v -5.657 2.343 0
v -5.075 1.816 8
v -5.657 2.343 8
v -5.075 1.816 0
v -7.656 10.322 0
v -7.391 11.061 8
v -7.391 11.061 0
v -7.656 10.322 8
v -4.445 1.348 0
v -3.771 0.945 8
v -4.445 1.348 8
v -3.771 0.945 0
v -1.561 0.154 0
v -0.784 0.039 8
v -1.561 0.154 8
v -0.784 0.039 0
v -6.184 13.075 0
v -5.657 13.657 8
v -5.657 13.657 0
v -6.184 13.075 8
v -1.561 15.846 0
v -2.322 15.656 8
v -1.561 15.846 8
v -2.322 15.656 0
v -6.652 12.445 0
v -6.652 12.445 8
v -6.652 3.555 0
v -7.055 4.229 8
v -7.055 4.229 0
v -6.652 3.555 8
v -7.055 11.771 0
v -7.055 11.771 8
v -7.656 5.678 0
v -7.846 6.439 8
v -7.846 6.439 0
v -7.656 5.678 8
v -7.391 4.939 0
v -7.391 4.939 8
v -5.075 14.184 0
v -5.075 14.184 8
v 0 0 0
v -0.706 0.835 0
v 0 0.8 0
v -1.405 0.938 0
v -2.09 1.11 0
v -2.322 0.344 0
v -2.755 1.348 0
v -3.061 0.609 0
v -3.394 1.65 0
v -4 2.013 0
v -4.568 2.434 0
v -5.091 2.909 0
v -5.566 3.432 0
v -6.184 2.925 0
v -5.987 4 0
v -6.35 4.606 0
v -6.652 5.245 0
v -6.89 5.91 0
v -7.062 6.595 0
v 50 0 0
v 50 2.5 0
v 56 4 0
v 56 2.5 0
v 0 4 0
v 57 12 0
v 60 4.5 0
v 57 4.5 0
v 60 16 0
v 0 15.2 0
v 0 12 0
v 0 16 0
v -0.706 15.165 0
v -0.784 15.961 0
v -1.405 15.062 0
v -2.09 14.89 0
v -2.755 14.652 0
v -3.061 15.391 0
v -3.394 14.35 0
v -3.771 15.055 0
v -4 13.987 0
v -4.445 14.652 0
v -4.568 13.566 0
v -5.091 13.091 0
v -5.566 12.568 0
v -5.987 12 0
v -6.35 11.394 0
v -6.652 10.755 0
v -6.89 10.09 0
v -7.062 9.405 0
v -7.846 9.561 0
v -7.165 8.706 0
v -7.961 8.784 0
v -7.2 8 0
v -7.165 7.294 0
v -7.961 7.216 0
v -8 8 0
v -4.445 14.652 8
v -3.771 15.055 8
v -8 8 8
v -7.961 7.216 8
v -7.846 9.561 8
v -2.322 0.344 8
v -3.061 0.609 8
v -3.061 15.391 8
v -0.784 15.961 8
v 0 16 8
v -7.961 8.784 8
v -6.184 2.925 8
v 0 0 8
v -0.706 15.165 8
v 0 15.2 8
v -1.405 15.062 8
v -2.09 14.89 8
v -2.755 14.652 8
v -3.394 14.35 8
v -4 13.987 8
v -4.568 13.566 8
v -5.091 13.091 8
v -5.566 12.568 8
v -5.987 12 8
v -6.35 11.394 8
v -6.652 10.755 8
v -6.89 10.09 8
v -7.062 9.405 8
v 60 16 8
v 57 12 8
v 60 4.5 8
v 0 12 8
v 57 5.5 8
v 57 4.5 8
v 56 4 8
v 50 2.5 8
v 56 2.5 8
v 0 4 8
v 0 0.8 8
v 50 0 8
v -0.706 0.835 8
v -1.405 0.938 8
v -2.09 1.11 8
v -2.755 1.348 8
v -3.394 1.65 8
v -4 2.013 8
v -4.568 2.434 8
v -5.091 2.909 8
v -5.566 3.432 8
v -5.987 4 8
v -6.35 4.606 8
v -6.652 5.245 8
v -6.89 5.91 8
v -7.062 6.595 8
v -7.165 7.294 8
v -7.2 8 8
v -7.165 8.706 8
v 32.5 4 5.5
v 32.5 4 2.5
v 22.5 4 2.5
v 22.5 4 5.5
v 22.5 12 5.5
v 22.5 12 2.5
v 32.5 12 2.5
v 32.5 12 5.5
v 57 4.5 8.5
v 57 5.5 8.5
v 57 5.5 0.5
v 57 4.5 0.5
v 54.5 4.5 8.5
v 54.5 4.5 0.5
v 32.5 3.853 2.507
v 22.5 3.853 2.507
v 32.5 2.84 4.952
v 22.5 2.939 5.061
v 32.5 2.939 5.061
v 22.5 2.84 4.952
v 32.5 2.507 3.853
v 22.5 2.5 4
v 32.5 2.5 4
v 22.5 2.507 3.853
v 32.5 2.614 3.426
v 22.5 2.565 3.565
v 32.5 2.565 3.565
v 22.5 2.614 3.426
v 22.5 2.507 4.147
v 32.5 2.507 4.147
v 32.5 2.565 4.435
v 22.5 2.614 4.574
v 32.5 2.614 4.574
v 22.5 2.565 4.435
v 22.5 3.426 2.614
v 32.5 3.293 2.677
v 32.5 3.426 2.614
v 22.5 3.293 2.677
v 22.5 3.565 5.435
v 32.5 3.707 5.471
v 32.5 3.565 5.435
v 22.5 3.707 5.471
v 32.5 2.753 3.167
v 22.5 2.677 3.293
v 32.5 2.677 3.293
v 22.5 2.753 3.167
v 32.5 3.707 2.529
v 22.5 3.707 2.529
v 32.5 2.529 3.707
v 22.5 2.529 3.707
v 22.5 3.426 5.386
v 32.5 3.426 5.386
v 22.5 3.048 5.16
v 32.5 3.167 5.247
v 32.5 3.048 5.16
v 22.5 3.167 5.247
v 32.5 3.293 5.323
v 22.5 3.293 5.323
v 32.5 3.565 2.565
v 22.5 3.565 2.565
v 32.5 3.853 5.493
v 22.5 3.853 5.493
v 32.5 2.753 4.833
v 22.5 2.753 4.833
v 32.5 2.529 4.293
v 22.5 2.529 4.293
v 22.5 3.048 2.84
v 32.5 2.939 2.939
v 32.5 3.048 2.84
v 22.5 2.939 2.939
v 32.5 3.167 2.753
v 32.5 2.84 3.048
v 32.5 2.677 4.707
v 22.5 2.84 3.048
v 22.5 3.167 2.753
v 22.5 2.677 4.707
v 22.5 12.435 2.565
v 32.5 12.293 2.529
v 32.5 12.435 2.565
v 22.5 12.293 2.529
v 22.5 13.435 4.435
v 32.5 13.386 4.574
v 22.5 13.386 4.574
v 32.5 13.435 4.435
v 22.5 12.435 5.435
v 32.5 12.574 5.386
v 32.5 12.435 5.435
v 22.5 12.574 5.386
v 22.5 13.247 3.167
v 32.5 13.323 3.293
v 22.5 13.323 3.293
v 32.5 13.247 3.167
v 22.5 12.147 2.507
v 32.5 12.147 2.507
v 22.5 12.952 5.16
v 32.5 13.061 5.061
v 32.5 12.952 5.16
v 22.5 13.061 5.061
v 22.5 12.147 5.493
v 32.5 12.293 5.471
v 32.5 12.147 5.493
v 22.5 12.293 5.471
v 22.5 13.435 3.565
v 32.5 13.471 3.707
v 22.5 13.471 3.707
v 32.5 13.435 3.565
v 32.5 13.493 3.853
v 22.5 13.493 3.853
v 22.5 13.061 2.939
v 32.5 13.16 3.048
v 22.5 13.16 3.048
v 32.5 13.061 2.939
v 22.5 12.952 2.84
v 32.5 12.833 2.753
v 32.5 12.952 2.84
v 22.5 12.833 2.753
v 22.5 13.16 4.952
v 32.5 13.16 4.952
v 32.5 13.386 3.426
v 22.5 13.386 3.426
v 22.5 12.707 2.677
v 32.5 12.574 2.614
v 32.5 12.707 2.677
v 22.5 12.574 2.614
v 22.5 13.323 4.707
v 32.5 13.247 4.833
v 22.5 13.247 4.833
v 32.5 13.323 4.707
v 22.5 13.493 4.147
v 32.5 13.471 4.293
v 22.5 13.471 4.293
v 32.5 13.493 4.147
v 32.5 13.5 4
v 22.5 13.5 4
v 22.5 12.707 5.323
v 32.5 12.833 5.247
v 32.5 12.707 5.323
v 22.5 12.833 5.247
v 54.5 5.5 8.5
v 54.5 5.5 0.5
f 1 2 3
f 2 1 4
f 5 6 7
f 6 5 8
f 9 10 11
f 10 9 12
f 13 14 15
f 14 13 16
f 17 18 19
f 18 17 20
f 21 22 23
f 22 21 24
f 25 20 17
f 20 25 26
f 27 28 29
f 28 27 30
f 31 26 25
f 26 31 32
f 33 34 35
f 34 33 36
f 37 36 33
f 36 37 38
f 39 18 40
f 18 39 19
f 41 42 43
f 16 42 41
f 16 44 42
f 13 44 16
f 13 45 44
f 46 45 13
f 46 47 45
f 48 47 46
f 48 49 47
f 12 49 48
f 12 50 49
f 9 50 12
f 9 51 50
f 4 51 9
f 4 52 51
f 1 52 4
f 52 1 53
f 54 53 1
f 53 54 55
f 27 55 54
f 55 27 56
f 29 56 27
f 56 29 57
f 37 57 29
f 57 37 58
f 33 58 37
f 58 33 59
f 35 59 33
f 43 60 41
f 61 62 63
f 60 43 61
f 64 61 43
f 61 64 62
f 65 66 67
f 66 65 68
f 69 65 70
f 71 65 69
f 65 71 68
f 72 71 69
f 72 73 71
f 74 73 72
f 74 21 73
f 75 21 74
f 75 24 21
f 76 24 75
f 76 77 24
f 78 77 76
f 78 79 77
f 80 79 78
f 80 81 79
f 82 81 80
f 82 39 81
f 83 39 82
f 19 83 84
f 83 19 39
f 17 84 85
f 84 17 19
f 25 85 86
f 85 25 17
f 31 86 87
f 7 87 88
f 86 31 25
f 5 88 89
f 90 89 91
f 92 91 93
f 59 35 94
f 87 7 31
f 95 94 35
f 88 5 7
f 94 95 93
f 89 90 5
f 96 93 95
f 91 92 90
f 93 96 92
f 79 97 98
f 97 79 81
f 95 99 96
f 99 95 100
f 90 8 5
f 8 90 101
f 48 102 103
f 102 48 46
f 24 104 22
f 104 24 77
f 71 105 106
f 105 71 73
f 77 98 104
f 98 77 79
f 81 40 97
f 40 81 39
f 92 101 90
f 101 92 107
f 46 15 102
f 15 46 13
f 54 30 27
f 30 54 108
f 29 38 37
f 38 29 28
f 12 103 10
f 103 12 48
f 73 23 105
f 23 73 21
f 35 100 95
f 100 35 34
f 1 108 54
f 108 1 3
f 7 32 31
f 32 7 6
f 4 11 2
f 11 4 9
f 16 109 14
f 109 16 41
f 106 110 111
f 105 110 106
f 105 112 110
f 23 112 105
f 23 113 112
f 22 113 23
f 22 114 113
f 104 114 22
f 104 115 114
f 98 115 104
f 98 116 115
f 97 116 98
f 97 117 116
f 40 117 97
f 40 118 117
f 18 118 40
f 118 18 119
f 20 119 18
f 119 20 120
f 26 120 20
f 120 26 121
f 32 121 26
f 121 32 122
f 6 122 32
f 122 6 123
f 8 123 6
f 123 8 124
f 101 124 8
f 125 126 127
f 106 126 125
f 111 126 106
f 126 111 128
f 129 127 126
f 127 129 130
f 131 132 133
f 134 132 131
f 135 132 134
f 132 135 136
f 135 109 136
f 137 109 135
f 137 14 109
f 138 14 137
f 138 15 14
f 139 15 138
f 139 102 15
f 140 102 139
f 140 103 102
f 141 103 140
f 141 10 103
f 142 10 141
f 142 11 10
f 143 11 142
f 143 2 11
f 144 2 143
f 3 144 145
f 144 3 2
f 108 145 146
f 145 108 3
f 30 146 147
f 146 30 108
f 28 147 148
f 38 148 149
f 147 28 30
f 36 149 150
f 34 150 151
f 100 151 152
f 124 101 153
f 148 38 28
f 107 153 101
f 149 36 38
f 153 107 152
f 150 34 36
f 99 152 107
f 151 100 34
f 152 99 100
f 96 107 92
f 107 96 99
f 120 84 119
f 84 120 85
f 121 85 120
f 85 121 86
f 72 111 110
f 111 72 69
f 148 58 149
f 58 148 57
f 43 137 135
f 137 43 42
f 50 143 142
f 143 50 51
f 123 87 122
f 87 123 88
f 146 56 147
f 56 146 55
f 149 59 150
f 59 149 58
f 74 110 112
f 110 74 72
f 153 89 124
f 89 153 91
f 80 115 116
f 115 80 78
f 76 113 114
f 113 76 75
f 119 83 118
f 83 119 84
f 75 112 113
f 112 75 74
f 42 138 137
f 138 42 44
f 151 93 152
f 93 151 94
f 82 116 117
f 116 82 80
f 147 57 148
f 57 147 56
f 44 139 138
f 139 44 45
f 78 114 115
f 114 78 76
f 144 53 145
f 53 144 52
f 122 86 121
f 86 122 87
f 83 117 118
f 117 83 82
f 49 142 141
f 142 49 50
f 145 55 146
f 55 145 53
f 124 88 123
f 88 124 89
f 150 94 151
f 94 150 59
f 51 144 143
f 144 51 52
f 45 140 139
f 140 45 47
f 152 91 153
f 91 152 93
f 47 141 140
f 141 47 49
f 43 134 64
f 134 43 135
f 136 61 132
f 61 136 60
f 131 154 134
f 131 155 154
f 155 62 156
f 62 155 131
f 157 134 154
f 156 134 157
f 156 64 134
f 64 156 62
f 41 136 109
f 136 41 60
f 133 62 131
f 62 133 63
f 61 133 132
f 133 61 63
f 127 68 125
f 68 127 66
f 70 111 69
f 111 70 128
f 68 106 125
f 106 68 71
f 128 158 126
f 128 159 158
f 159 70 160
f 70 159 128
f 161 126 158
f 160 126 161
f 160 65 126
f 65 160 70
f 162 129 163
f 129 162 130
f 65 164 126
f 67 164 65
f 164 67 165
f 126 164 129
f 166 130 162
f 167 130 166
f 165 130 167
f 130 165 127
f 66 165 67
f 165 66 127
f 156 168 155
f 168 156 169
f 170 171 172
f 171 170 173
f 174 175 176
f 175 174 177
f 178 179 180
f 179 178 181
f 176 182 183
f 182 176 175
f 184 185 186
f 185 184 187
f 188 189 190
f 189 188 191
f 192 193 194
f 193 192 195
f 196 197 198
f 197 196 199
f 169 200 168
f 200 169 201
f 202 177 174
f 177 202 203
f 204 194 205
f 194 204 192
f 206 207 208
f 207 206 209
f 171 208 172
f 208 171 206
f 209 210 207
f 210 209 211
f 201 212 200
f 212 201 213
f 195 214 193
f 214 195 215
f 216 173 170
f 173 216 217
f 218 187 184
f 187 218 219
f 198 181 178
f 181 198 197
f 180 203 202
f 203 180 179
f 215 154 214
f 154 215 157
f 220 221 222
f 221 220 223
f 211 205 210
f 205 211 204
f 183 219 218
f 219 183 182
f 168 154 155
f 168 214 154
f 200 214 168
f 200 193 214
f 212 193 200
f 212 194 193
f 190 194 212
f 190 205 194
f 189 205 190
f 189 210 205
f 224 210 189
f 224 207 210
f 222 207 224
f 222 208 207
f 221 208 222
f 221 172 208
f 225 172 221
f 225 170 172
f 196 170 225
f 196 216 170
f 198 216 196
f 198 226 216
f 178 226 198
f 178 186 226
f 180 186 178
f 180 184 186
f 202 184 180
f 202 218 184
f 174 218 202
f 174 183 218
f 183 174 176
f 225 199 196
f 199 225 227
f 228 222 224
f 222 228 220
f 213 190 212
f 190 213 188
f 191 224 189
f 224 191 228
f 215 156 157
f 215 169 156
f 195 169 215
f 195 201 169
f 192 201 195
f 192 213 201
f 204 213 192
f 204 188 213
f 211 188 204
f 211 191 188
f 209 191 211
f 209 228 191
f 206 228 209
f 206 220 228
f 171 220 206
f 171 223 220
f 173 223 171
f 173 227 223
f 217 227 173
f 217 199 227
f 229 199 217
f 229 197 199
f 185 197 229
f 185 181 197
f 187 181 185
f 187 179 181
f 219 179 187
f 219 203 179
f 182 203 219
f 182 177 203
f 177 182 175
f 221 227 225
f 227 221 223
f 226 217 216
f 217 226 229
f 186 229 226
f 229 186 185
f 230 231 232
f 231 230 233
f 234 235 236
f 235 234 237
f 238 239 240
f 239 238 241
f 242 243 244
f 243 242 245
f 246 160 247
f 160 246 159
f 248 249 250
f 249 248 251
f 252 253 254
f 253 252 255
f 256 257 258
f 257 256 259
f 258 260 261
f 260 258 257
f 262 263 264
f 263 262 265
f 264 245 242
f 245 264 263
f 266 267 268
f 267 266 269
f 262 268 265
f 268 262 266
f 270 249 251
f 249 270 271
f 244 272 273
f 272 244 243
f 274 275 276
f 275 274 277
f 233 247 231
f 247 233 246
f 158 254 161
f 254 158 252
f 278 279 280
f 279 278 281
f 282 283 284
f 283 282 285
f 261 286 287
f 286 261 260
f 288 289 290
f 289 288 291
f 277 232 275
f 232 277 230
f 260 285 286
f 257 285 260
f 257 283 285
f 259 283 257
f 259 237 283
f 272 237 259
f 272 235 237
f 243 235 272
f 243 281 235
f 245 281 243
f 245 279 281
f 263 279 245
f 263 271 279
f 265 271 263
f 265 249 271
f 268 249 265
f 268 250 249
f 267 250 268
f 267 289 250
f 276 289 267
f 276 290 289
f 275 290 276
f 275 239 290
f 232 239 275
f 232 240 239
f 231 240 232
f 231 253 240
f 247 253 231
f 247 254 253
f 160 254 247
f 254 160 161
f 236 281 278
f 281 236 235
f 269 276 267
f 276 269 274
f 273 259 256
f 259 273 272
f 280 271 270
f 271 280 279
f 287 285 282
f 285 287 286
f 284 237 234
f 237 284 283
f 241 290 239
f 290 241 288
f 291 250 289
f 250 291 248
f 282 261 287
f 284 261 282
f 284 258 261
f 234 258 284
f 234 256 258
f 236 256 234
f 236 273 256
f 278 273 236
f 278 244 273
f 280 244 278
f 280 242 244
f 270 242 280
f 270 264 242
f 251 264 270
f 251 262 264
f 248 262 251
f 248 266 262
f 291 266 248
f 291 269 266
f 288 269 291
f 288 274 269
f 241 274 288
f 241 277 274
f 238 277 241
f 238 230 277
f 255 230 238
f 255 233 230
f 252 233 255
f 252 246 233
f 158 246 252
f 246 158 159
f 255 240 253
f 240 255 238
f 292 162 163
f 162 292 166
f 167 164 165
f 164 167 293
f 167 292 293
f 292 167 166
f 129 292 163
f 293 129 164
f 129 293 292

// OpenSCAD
// --- Parameters ---
// Dimensions in mm
thickness = 8;               // Extrusion depth along Z
lower_bar_len = 50;          // Length of lower bar
lower_bar_width = 4;         // Width of lower bar
lower_tongue_len = 6;         // Length of lower tongue (50 to 56)
lower_tongue_width = 1.5;    // Width of lower tongue (4 - 2.5 = 1.5)
lower_tongue_start_y = 2.5; // Y-offset for tongue

upper_bar_len = 60;          // Length of upper bar
upper_bar_width = 4;         // Width of upper bar
upper_bar_y_start = 12;      // Y-position of upper bar start
upper_bar_y_end = 16;        // Y-position of upper bar end

hinge_radius_inner = 7.2;    // Inner radius of hinge
hinge_radius_outer = 8.0;    // Outer radius of hinge
hinge_center_x = 0;          // X-center of hinge
hinge_center_y = 8;          // Y-center of hinge

pinch_ridge_radius = 1.5;    // Radius of the half-round ridge
pinch_ridge_x = 27.5;        // X-position of the ridge

latch_leg_x_start = 57;       // Start of latch leg
latch_leg_x_end = 60;         // End of latch leg
latch_leg_y_start = 4.5;      // Start of latch leg Y
latch_leg_y_end = 12;        // End of latch leg Y

latch_nose_x_start = 54.5;    // Start of latch nose
latch_nose_x_end = 57;        // End of latch nose
latch_nose_y_start = 4.5;     // Start of latch nose Y
latch_nose_y_end = 5.5;       // End of latch nose Y
latch_nose_z_offset = 0.5;    // Z-offset for the nose relative to the tongue

$fn = 64;

// --- Construction ---

module pinch_clamp() {
    // The specification describes a 2D profile extruded 8mm along Z.
    // The latch nose is "0.5mm above the tongue". 
    // To satisfy the "2D profile extruded 8mm" while including the nose,
    // the nose must be part of the profile geometry. 
    // However, "0.5mm above" implies a Z-offset. 
    // To ensure a single watertight solid that matches the bounding box 
    // and the "2D profile extruded" description, we treat the nose 
    // as a separate volume that is part of the single solid.
    
    union() {
        difference() {
            union() {
                // 1. Lower Jaw Bar
                cube([lower_bar_len, lower_bar_width, thickness]);
                
                // 2. Lower Jaw Tongue
                translate([lower_bar_len, lower_tongue_start_y, 0])
                    cube([lower_tongue_len, lower_tongue_width, thickness]);
                
                // 3. Upper Jaw Bar
                translate([0, upper_bar_y_start, 0])
                    cube([upper_bar_len, upper_bar_width, thickness]);
                
                // 4. Hinge (Half-ring on the left)
                // Centered at (0,8), radii 7.2 and 8.0.
                // The hinge is on the x < 0 side.
                translate([hinge_center_x, hinge_center_y, 0])
                difference() {
                    cylinder(r = hinge_radius_outer, h = thickness);
                    cylinder(r = hinge_radius_inner, h = thickness + 0.1);
                    // Cut the right half to leave the left half (x < 0)
                    translate([0, -hinge_radius_outer - 1, -0.5])
                        cube([hinge_radius_outer + 1, hinge_radius_outer * 2, thickness + 1]);
                }
                
                // 5. Latch Leg
                translate([latch_leg_x_start, latch_leg_y_start, 0])
                    cube([latch_leg_x_end - latch_leg_x_start, latch_leg_y_end - latch_leg_y_start, thickness]);
            }

            // --- Subtractions (Cuts) ---

            // 6. Lower Pinch Ridge (Half-round cut into the inner face)
            // Inner face of lower bar is at y = 4.
            // The ridge is a "half-round" ridge on the inner face.
            // This means the ridge protrudes into the space, so we subtract a cylinder.
            translate([pinch_ridge_x, lower_bar_width, thickness/2])
                rotate([0, 90, 0])
                cylinder(r = pinch_ridge_radius, h = 10, center = true);
            
            // 7. Upper Pinch Ridge (Half-round cut into the inner face)
            // Inner face of upper bar is at y = 12.
            translate([pinch_ridge_x, upper_bar_y_start, thickness/2])
                rotate([0, 90, 0])
                cylinder(r = pinch_ridge_radius, h = 10, center = true);
        }

        // 8. Latch Nose (The part that snaps)
        // "0.5 mm above the tongue" -> Z-offset.
        // To ensure it's part of the same solid and watertight:
        translate([latch_nose_x_start, latch_nose_y_start, latch_nose_z_offset])
            cube([latch_nose_x_end - latch_nose_x_start, latch_nose_y_end - latch_nose_y_start, thickness]);
    }
}

// Render the part
pinch_clamp();
